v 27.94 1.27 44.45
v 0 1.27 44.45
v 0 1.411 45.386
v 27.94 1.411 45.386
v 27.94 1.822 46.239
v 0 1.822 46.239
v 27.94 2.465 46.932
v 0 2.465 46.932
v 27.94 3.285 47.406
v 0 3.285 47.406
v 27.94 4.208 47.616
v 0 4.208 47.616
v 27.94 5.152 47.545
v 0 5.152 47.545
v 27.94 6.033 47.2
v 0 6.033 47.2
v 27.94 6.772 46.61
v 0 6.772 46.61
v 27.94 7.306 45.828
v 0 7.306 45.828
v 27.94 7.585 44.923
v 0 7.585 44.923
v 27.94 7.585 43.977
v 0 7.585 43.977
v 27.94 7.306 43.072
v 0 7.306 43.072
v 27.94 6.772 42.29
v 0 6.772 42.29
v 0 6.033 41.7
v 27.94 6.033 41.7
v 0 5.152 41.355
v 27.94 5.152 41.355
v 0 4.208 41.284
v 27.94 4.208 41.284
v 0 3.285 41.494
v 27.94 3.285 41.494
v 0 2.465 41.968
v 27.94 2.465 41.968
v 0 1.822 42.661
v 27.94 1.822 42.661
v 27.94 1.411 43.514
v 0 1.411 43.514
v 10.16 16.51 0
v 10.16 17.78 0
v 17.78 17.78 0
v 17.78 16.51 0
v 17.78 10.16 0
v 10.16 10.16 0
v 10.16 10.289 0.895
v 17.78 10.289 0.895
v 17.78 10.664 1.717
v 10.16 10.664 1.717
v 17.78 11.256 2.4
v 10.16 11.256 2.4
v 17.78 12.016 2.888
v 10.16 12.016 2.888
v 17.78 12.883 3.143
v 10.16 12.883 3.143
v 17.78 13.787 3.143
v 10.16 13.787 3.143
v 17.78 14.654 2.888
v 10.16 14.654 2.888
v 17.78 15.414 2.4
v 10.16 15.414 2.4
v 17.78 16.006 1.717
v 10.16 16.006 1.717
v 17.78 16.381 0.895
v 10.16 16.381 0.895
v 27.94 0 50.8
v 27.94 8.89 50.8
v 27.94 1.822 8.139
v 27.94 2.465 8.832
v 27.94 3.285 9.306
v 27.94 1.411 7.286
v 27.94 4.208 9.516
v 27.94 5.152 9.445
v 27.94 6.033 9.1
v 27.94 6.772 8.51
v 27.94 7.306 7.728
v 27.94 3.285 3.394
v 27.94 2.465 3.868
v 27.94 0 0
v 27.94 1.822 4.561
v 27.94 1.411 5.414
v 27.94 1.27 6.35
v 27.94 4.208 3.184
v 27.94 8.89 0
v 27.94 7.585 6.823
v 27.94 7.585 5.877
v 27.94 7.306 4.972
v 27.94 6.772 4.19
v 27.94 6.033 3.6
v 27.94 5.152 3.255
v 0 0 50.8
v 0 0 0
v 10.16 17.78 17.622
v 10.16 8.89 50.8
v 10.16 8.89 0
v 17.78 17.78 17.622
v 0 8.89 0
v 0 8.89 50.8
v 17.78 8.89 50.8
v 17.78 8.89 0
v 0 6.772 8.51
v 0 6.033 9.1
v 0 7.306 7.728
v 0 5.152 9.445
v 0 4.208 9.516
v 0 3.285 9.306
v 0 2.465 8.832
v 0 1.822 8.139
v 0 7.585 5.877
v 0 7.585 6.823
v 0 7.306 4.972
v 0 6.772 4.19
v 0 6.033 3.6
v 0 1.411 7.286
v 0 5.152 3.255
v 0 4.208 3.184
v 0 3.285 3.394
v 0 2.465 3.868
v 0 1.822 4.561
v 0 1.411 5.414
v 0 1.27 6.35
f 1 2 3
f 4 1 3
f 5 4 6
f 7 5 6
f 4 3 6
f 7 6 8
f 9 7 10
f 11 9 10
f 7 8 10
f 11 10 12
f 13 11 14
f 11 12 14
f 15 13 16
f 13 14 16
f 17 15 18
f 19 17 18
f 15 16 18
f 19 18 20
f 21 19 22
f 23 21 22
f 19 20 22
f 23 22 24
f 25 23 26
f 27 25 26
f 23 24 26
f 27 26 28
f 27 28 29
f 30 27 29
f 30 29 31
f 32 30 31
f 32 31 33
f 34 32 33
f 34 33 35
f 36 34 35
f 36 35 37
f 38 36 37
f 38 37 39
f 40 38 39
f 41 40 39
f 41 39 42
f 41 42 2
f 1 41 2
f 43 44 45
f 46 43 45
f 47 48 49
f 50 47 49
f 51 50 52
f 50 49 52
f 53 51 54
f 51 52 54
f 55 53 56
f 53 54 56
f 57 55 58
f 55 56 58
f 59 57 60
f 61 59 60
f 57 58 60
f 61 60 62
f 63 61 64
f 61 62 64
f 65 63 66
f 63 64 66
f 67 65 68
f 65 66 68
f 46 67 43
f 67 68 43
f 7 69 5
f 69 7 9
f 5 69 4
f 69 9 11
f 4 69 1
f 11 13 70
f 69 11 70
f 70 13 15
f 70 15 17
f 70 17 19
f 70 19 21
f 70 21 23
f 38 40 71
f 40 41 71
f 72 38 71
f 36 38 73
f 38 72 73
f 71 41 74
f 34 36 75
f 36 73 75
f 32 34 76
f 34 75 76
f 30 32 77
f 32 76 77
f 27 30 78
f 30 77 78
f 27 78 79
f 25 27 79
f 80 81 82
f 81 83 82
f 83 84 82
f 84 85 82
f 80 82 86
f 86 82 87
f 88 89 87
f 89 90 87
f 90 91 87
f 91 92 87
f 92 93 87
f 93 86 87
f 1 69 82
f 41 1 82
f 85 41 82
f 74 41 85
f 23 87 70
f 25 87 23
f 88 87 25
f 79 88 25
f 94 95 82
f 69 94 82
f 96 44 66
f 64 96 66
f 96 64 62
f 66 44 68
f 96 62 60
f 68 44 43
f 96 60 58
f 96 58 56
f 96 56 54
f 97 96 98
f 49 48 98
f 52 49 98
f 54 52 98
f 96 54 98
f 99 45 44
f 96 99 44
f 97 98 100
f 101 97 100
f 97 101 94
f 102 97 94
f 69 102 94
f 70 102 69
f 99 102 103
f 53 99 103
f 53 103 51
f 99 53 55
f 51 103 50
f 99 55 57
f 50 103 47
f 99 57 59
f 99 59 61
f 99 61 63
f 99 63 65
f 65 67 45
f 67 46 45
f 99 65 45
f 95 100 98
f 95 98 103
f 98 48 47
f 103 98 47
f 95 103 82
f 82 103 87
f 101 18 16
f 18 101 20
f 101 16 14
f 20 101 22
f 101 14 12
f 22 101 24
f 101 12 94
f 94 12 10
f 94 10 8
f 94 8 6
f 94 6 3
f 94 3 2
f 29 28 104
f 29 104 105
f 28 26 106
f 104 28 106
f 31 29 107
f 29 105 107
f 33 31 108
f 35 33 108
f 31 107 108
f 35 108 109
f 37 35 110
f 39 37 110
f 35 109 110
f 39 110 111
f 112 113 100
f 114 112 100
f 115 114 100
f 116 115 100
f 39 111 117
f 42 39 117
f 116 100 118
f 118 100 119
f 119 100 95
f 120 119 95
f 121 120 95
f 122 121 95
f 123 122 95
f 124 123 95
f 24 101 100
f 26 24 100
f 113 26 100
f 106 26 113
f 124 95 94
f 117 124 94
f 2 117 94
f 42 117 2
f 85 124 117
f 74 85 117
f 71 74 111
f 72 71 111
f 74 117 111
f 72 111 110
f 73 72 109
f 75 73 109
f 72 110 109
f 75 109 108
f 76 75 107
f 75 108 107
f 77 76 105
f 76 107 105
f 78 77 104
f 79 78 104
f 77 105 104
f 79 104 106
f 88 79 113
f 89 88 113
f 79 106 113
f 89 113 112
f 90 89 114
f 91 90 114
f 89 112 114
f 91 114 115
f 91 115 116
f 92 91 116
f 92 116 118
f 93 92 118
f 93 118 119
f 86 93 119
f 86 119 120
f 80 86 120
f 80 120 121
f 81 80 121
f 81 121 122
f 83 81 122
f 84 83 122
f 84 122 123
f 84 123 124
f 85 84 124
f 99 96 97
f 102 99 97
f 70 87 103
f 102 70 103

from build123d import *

# Parameters (mm, degrees)
F1_DEPTH = 50.8
F3_DEPTH = 25.4
F4_R     = 3.175
F5_DEPTH = 38.1


with BuildPart() as f1:
    # F0 (on Top) → F1 (new body)
    with BuildSketch(Plane.XY):
        Polygon((0, 8.89), (0, 0), (27.94, 0), (27.94, 8.89), (17.78, 8.89), (17.78, 17.78), (10.16, 17.78), (10.16, 8.89), align=None)
    extrude(amount=F1_DEPTH)

    # F2 (on face) → F3 (cut)
    with BuildSketch(Plane(origin=(10.16, 0, 0), x_dir=(0, -1, 0), z_dir=(-1, 0, 0))):
        Polygon((-17.78, 17.622068), (-8.89, 50.8), (-17.78, 50.8), align=None)
        with BuildLine():
            Line((-16.51, 0), (-10.16, 0))
            ThreePointArc((-10.16, 0), (-13.335, 3.175), (-16.51, 0))
        make_face()
    extrude(amount=-F3_DEPTH, mode=Mode.SUBTRACT)

    # F4 (on face) → F5 (cut)
    with BuildSketch(Plane(origin=(0, 0, 0), x_dir=(0, -1, 0), z_dir=(-1, 0, 0))):
        with Locations((-4.445, 44.45)):
            Circle(F4_R)
        with Locations((-4.445, 6.35)):
            Circle(F4_R)
    extrude(amount=-F5_DEPTH, mode=Mode.SUBTRACT)


solid = f1.part
